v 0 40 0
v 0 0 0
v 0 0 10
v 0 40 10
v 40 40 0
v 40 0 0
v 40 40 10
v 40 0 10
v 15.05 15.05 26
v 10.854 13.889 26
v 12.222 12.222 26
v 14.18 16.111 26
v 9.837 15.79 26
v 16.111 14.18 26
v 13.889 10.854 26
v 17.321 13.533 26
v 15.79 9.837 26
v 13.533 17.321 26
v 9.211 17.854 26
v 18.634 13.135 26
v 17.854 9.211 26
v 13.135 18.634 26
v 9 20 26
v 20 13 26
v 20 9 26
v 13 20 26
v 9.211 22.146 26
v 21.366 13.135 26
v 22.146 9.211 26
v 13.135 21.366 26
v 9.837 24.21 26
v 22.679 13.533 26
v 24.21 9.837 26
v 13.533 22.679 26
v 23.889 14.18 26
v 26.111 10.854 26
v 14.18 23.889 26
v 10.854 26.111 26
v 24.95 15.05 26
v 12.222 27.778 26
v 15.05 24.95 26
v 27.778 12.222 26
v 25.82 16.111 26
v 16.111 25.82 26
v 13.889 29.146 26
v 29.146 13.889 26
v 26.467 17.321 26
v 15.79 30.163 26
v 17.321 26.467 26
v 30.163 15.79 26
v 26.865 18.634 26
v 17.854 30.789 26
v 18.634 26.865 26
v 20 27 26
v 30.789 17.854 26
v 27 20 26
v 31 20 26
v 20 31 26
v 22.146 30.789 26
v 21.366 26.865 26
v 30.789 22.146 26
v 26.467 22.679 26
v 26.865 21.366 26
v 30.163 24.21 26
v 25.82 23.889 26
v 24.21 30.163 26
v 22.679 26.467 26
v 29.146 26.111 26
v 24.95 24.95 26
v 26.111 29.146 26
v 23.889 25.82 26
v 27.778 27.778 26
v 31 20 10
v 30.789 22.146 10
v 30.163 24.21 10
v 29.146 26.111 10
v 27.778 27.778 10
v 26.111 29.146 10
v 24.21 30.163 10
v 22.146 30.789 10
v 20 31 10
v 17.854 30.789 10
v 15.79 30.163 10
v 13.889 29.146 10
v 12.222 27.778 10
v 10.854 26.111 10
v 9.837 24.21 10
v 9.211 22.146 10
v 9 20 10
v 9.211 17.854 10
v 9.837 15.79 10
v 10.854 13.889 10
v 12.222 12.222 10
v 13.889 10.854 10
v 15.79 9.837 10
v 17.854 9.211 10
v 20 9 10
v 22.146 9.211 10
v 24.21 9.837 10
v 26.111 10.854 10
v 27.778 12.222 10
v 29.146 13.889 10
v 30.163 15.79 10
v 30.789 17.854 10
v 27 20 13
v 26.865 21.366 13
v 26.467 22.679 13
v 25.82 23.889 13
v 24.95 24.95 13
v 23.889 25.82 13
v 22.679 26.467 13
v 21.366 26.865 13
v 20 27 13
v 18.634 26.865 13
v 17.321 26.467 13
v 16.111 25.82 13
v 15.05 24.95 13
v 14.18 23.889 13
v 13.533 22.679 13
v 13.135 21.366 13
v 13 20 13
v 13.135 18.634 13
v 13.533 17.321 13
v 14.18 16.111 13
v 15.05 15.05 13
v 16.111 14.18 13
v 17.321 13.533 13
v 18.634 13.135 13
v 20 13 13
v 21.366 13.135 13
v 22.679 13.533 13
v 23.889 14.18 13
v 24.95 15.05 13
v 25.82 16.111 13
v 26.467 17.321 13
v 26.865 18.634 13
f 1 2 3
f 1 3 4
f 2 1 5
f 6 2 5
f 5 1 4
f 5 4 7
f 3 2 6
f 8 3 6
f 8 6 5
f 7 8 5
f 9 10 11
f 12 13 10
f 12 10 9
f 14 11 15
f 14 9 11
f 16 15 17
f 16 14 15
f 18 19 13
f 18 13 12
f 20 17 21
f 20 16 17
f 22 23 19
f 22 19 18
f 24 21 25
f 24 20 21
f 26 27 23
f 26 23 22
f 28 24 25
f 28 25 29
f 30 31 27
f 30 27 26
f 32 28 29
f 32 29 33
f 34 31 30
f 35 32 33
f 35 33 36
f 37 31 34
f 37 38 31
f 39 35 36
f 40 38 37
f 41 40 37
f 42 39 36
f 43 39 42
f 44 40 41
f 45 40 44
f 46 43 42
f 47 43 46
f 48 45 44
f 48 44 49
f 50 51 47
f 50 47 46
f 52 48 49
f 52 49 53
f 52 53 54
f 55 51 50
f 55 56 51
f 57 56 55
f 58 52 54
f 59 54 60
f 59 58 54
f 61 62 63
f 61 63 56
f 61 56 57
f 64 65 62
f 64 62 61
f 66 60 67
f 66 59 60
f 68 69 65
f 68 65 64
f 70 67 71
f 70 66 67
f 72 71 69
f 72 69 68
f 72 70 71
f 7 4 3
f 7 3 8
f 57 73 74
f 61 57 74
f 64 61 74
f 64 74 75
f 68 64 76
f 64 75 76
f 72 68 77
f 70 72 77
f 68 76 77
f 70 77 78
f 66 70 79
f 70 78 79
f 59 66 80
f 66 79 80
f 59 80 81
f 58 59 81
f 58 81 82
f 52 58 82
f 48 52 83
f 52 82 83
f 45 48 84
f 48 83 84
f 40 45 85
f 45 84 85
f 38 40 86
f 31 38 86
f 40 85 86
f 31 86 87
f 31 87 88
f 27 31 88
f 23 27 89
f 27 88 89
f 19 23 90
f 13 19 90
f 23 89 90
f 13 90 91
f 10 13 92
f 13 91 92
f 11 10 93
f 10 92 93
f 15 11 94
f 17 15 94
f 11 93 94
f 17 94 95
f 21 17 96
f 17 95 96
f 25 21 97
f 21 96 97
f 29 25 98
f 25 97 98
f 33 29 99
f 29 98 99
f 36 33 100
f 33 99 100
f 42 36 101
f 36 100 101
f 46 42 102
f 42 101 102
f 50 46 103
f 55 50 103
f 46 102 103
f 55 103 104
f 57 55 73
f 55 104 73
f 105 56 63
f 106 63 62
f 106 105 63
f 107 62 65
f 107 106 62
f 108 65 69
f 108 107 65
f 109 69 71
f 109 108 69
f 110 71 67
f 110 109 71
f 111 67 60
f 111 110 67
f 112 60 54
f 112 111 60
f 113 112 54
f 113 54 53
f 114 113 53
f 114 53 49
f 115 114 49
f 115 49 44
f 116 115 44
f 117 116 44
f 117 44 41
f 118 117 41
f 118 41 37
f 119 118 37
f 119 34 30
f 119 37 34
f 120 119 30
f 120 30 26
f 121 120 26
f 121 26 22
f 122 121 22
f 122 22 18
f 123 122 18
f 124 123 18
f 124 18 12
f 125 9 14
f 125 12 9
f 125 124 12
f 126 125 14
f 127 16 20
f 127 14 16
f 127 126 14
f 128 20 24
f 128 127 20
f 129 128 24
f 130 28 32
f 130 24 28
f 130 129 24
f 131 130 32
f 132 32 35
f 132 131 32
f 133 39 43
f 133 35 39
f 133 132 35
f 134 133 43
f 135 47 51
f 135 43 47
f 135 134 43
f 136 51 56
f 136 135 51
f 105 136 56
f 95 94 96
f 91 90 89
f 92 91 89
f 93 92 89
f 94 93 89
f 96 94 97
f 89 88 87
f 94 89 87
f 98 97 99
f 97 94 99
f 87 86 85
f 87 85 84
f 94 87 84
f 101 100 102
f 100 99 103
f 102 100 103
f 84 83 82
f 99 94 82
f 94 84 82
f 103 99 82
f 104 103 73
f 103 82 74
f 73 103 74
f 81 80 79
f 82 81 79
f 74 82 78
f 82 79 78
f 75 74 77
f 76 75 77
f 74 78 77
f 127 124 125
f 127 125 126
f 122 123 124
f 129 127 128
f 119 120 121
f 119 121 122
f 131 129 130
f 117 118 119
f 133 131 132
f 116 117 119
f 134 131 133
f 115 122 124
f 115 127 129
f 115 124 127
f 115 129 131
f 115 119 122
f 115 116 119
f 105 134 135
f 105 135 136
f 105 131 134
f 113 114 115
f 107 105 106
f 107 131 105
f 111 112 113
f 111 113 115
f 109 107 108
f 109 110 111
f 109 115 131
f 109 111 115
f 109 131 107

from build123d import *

# Parameters (mm, degrees)
SKETCH_W          = 40
SKETCH_H          = 40
EXTRUDE_DEPTH     = 10
CYLINDER001_R     = 7
CYLINDER001_DEPTH = 19
CYLINDER_R        = 11
CYLINDER_DEPTH    = 16


with BuildPart() as extrude_body:
    # Sketch → Extrude (new body)
    with BuildSketch(Plane.XY):
        with Locations((20, 20)):
            Rectangle(SKETCH_W, SKETCH_H)
    extrude(amount=EXTRUDE_DEPTH)


with BuildPart() as cylinder001:
    # Cylinder001 → Cylinder001 (new body)
    with BuildSketch(Plane(origin=(20, 20, 13), x_dir=(1, 0, 0), z_dir=(0, 0, 1))):
        Circle(CYLINDER001_R)
    extrude(amount=CYLINDER001_DEPTH)


with BuildPart() as cut:
    # Cylinder → Cylinder (new body)
    with BuildSketch(Plane(origin=(20, 20, 10), x_dir=(1, 0, 0), z_dir=(0, 0, 1))):
        Circle(CYLINDER_R)
    extrude(amount=CYLINDER_DEPTH)

    # Cut: cut Cylinder001
    add(cylinder001.part, mode=Mode.SUBTRACT)


solid = Compound([extrude_body.part, cut.part])
